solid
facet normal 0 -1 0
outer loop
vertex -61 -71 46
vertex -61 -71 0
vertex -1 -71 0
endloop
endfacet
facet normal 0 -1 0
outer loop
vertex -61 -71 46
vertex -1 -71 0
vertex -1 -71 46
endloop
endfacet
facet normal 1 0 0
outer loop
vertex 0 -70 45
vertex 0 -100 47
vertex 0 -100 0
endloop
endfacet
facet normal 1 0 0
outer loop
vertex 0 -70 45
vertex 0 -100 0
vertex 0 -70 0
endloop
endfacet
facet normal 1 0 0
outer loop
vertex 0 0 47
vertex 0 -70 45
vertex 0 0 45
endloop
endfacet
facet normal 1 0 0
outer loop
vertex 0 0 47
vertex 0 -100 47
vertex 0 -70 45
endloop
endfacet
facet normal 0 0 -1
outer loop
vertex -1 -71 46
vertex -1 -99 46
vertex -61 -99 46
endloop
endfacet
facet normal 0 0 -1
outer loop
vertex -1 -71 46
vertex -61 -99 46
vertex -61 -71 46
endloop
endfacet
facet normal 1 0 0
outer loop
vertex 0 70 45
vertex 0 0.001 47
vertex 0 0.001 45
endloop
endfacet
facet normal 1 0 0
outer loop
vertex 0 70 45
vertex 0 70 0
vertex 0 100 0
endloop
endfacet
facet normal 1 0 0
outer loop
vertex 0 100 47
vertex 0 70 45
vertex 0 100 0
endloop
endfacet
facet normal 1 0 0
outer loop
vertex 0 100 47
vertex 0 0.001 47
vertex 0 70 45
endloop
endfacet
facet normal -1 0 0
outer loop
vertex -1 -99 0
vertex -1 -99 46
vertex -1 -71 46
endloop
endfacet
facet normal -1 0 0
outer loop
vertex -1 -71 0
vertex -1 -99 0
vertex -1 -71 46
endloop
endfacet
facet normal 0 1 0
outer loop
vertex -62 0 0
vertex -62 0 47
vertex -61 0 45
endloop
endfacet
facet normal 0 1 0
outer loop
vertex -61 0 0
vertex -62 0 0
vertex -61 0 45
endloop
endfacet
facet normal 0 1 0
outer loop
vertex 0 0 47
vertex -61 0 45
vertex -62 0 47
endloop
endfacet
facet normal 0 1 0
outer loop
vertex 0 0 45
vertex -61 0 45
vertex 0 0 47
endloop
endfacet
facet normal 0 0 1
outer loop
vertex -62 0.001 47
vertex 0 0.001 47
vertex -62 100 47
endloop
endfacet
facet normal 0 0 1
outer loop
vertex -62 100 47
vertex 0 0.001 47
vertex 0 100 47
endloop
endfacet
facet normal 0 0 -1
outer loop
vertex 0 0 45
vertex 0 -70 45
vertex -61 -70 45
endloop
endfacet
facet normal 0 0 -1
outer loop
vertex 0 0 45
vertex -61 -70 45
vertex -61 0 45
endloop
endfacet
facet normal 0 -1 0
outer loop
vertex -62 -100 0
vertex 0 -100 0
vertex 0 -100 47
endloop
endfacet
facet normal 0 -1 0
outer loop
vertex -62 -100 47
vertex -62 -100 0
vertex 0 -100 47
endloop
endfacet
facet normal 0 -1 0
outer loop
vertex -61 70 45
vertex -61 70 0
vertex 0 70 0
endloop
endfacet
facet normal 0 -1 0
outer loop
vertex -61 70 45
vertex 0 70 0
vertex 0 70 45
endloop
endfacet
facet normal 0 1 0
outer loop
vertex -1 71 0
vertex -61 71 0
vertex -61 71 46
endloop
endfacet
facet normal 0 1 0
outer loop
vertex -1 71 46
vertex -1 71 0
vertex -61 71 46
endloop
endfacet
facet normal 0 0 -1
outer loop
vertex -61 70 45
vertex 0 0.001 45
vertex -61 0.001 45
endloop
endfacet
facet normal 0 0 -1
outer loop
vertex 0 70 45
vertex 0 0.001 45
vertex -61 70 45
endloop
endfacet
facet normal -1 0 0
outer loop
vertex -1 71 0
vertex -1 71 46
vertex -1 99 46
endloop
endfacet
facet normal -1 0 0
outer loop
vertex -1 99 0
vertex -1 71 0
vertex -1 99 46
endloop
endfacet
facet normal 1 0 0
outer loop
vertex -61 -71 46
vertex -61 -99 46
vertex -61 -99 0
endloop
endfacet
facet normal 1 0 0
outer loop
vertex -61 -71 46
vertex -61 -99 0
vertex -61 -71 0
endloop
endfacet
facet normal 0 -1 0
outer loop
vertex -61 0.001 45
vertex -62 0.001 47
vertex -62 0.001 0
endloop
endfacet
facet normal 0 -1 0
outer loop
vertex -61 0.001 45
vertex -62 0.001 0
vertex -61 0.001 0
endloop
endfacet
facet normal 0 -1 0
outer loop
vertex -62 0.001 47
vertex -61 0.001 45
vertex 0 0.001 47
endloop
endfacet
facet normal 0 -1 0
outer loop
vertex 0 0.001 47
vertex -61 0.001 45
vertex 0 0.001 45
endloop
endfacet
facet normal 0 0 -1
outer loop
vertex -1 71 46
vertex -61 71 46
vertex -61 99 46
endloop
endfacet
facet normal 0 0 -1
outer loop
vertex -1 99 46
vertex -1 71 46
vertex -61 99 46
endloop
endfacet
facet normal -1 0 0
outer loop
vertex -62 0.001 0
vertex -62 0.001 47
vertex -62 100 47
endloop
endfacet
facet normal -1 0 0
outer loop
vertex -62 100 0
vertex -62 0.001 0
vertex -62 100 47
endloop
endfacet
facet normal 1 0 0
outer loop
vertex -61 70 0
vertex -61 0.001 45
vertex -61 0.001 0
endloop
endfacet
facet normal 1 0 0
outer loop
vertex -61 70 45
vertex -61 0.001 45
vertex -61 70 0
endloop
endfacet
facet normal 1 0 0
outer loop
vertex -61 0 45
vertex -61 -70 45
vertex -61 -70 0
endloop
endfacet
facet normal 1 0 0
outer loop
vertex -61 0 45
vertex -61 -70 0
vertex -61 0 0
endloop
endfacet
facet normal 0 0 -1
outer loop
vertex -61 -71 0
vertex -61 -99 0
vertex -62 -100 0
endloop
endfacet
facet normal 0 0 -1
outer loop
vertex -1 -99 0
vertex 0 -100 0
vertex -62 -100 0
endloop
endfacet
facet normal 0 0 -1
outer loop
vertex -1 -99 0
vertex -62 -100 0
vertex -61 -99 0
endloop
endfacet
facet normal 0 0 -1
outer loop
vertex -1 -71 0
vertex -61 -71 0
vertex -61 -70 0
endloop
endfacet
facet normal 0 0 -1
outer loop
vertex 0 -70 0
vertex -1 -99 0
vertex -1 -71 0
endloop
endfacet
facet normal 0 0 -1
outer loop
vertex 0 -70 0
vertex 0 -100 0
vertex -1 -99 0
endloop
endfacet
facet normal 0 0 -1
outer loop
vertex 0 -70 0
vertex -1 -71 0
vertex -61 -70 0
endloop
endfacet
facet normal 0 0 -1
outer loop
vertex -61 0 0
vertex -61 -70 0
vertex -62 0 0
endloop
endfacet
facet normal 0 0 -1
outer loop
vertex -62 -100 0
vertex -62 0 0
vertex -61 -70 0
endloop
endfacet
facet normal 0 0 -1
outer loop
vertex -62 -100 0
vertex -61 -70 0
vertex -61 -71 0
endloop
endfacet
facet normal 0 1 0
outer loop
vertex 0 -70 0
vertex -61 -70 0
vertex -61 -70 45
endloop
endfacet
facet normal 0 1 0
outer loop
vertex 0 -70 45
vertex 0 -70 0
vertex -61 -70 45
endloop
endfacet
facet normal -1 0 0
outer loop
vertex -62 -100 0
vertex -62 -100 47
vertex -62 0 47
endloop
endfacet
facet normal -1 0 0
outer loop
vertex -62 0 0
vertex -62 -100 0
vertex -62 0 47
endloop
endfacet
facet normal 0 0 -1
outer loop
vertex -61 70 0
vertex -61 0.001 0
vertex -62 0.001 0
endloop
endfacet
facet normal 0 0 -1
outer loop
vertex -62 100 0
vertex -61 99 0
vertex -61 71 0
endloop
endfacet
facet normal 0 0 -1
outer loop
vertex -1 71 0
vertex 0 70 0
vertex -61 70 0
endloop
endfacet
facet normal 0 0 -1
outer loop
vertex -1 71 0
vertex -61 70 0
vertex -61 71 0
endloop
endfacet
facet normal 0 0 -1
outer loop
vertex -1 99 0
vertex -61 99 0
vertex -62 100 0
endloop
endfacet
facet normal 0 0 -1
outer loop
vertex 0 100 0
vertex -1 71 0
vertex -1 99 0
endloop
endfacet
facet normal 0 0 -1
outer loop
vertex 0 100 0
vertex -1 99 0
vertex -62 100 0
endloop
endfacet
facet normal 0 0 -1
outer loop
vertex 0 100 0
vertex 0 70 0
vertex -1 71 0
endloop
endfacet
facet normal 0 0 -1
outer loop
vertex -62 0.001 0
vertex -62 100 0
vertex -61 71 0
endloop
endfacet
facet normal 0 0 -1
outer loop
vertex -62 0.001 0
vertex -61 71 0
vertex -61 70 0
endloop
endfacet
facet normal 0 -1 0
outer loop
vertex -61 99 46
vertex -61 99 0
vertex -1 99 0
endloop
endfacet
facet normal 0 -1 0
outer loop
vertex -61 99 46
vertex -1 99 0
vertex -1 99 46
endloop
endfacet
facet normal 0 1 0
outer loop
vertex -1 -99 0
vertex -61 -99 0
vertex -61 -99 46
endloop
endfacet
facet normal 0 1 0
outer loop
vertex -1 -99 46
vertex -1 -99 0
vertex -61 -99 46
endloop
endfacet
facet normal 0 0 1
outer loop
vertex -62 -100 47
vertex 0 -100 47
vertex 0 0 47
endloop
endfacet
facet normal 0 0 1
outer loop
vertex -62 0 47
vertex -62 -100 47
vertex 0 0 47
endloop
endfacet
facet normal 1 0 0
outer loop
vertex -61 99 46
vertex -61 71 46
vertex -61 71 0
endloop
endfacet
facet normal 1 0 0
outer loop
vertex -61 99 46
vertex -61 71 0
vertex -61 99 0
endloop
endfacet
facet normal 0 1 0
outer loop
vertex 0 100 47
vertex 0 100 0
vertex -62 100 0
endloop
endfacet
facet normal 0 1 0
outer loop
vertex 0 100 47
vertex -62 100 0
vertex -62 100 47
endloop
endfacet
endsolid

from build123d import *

# Parameters (mm, degrees)
F0_W        = 200
F0_H        = 47
F1_DEPTH    = 62
F2_W        = 140
F2_H        = 45
F3_DEPTH    = 61
F4_T        = 1
F4_T3_DEPTH = 63
F4_T5_DEPTH = 47
F4_T7_DEPTH = 142
F5_W        = 70.8849802613
F5_H        = 0.001
F6_DEPTH    = 120


# Not quite as in the source:
# - a shell that OpenCascade refuses in one call is made with other operations: the cavity is built on its own and cut out


with BuildPart() as f1:
    # F0 (on Right) → F1 (new body)
    with BuildSketch(Plane.YZ):
        with Locations((0, 23.5)):
            Rectangle(F0_W, F0_H)
    extrude(amount=-F1_DEPTH)

    # F2 (on face) → F3 (cut)
    with BuildSketch(Plane.YZ):
        with Locations((0, 22.5)):
            Rectangle(F2_W, F2_H)
    extrude(amount=-F3_DEPTH, mode=Mode.SUBTRACT)

    # F4: shell of thickness 1, made by hand


with BuildPart() as f4_core1:
    # F4_t2: copy of F1
    add(f1.part)

    # the walls: a layer under each face that stays
    f4_faces = [f4_core1.faces().sort_by_distance(p)[0] for p in [
        (-31, -100, 23.5),
        (-31, 0, 47),
        (0, -85.7142857143, 3.3571428571),
        (-62, 0, 23.5),
        (-31, 100, 23.5),
        (-30.5, -70, 22.5),
        (-61, 0, 22.5),
        (-30.5, 70, 22.5),
        (-30.5, 0, 45),
    ]]
    thicken(f4_faces, amount=-F4_T, mode=Mode.SUBTRACT)

    # F4_s4 → F4_t3 (cut)
    with BuildSketch(Plane.YZ.offset(-62)):
        Polygon((-69.99, 44.99), (-71, 45), (-71, 46), (-70, 46), align=None)
        Polygon((69.99, 44.99), (71, 45), (71, 46), (70, 46), align=None)
    extrude(amount=F4_T3_DEPTH, mode=Mode.SUBTRACT)

    # F4_s6 → F4_t5 (cut)
    with BuildSketch(Plane.XY.offset(-1)):
        Polygon((-60.99, -69.99), (-61, -71), (-62, -71), (-62, -70), align=None)
        Polygon((-60.99, 69.99), (-62, 70), (-62, 71), (-61, 71), align=None)
    extrude(amount=F4_T5_DEPTH, mode=Mode.SUBTRACT)

    # F4_s8 → F4_t7 (cut)
    with BuildSketch(Plane.XZ.offset(-71)):
        Polygon((-60.99, 44.99), (-62, 45), (-62, 46), (-61, 46), align=None)
    extrude(amount=F4_T7_DEPTH, mode=Mode.SUBTRACT)


with BuildPart() as f1_1:
    add(f1.part)

    # what is left inside the walls is the cavity
    f4_cavity = [f4_core1.part.solids().sort_by_distance(p)[0] for p in [
        (-41, -98.99, 23),
        (-41, 98.99, 23),
    ]]
    add(f4_cavity, mode=Mode.SUBTRACT)

    # F5 (on face) → F6 (cut)
    with BuildSketch(Plane(origin=(0, 0, 0), x_dir=(1, 0, 0), z_dir=(0, 0, -1))):
        with Locations((-35.4424901307, -0.0005)):
            Rectangle(F5_W, F5_H)
    extrude(amount=-F6_DEPTH, mode=Mode.SUBTRACT)


solid = f1_1.part
